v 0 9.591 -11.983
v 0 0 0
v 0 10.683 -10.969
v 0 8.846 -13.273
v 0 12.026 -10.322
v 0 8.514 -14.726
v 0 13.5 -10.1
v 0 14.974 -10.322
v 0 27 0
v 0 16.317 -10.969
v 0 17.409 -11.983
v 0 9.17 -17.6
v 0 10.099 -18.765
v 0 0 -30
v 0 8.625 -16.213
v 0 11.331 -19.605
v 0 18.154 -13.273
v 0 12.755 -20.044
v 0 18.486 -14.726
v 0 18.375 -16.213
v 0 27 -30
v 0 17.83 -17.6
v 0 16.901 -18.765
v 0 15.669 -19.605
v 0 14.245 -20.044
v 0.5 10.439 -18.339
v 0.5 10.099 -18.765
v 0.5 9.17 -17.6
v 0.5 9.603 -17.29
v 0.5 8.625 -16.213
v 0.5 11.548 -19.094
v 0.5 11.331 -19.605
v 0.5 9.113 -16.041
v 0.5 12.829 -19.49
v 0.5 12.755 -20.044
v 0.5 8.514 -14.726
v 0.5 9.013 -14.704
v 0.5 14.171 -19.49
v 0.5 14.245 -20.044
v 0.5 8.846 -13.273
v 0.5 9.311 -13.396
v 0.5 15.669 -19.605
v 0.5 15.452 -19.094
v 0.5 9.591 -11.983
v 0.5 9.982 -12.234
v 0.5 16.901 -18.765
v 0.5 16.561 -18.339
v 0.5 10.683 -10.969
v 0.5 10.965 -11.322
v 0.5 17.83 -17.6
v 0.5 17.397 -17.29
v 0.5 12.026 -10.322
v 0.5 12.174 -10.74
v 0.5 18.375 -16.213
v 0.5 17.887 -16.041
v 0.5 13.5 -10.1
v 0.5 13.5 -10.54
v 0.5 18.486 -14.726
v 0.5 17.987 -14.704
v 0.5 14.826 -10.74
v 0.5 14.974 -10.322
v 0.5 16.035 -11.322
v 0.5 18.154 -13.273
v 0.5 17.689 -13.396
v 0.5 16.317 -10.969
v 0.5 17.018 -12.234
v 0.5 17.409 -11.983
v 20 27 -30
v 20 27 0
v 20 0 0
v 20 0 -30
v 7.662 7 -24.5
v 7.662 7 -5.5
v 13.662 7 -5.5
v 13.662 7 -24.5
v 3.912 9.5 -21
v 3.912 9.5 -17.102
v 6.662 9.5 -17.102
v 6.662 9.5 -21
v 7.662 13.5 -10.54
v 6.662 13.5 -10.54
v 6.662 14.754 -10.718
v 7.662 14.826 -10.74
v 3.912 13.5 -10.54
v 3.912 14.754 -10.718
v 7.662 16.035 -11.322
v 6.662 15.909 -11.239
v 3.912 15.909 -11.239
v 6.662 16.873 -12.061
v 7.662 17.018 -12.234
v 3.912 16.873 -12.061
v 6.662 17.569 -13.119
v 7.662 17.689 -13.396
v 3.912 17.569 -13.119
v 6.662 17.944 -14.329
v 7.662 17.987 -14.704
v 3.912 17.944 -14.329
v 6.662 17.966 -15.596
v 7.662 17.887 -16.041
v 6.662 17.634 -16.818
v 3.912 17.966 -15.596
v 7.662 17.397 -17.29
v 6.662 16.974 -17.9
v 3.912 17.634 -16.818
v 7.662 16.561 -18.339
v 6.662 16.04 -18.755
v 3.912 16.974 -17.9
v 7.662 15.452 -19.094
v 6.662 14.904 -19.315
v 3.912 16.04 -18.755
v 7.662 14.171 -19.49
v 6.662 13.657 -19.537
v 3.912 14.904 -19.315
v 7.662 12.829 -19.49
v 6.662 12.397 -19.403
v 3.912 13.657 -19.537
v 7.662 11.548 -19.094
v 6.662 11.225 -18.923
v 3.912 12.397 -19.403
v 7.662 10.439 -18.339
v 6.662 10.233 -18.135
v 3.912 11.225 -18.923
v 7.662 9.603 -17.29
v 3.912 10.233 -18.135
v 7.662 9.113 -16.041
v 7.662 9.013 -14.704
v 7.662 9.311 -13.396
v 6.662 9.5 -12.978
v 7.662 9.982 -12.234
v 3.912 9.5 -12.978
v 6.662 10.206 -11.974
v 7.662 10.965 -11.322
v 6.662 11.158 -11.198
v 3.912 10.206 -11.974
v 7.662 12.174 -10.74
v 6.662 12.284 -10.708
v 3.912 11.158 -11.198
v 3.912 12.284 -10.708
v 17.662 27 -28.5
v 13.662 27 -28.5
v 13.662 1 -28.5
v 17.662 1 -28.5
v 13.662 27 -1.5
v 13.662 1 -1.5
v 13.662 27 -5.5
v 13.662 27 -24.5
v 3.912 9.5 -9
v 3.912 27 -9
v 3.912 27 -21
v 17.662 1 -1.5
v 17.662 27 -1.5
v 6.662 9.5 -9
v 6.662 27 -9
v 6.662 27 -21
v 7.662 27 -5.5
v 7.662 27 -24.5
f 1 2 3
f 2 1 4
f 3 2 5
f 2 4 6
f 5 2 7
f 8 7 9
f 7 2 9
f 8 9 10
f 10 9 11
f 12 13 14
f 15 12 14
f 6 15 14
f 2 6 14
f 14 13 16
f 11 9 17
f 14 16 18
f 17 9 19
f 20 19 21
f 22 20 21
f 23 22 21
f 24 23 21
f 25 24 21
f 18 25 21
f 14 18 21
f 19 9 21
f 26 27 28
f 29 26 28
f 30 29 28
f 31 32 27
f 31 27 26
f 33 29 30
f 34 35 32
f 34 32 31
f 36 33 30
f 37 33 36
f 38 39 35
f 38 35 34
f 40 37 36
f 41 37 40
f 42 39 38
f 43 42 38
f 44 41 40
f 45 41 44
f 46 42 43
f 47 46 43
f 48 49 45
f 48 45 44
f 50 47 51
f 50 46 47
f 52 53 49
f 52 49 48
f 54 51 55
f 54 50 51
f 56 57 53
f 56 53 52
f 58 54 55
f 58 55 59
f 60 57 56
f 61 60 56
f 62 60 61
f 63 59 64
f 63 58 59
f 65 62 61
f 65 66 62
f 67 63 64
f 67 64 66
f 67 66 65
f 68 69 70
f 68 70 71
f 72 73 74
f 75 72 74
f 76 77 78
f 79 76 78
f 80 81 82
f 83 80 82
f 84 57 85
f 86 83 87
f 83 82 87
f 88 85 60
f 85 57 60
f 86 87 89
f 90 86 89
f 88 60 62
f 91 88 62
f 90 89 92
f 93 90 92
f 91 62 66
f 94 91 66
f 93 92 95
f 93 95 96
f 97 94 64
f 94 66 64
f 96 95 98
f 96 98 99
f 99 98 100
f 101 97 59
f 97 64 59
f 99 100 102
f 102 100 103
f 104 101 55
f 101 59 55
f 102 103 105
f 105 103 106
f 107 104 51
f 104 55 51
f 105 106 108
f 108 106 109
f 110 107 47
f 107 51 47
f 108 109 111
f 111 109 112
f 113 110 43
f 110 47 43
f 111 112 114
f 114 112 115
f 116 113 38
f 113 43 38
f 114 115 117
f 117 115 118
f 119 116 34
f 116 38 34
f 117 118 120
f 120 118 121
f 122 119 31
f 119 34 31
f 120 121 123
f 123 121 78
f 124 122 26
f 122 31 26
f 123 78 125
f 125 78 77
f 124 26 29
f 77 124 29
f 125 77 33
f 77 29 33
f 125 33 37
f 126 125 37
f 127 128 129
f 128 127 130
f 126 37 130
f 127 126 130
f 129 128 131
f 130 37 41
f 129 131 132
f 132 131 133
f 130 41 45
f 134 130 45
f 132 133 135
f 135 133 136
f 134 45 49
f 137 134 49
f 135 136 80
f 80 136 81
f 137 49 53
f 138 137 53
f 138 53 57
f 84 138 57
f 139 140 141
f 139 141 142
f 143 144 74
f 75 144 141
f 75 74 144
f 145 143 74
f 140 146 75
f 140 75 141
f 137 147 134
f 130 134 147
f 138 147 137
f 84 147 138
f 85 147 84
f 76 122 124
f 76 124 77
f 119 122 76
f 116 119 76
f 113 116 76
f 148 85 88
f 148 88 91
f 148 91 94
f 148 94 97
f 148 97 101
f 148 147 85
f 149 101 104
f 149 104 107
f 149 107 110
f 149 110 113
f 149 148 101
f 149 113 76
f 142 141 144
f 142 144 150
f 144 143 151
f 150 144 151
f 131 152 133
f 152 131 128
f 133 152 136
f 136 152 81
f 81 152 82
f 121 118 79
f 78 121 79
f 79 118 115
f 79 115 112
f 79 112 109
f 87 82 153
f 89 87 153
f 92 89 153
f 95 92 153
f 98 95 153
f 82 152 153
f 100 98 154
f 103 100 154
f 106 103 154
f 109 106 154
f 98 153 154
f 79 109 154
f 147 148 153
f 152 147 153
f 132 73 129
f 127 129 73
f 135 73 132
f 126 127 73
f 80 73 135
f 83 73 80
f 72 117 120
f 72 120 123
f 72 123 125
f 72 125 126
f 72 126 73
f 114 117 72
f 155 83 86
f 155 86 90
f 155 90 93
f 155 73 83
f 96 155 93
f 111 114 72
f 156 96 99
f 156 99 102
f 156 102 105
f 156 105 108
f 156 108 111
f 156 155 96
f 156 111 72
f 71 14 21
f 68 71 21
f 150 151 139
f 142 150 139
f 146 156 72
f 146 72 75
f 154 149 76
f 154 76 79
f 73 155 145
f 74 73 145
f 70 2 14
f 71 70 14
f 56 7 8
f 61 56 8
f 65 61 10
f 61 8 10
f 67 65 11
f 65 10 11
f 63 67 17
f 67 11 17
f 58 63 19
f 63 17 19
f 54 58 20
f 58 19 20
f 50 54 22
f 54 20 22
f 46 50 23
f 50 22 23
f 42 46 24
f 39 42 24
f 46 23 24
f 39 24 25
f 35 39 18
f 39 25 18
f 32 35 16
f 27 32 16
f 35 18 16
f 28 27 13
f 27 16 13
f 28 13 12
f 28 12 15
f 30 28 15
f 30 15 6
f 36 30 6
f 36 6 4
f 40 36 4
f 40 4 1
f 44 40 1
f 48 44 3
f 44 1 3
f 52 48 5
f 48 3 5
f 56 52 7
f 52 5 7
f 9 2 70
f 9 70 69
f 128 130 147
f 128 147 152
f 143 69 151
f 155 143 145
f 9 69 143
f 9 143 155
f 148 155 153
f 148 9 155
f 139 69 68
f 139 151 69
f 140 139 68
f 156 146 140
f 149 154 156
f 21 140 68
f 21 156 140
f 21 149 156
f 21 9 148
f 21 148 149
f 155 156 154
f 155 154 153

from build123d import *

# Parameters (mm, degrees)
SKETCH2_W           = 30
SKETCH2_H           = 27
BOSS_EXTRUDE1_DEPTH = 20
SKETCH6_W           = 4
SKETCH6_H           = 27
CUT_EXTRUDE4_DEPTH  = 26
SKETCH9_W           = 6
SKETCH9_H           = 19
CUT_EXTRUDE5_DEPTH  = 20
SKETCH11_R          = 5
CUT_EXTRUDE8_DEPTH  = 0.5
SKETCH12_W          = 2.75
SKETCH12_H          = 12
CUT_EXTRUDE12_DEPTH = 17.5
SKETCH15_R          = 4.5
CUT_EXTRUDE13_DEPTH = 10


with BuildPart() as part:
    # Sketch2 → Boss-Extrude1 (new body)
    with BuildSketch(Plane(origin=(0, 0, 0), x_dir=(0, 0, -1), z_dir=(1, 0, 0))):
        with Locations((15, 13.5)):
            Rectangle(SKETCH2_W, SKETCH2_H)
    extrude(amount=BOSS_EXTRUDE1_DEPTH)

    # Sketch6 → Cut-Extrude4 (cut)
    with BuildSketch(Plane(origin=(2.296116437, 27, -0.293484995), x_dir=(1, 0, 0), z_dir=(0, 1, 0))):
        with Locations((13.365844825, 14.706515005)):
            Rectangle(SKETCH6_W, SKETCH6_H)
    extrude(amount=-CUT_EXTRUDE4_DEPTH, mode=Mode.SUBTRACT)

    # Sketch9 → Cut-Extrude5 (cut)
    with BuildSketch(Plane(origin=(0, 27, 0), x_dir=(1, 0, 0), z_dir=(0, 1, 0))):
        with Locations((10.661961261, 15)):
            Rectangle(SKETCH9_W, SKETCH9_H)
    extrude(amount=-CUT_EXTRUDE5_DEPTH, mode=Mode.SUBTRACT)

    # Sketch11 → Cut-Extrude8 (cut)
    with BuildSketch(Plane.ZY):
        with Locations((-15.1, 13.5)):
            Circle(SKETCH11_R)
    extrude(amount=-CUT_EXTRUDE8_DEPTH, mode=Mode.SUBTRACT)

    # Sketch12 → Cut-Extrude12 (cut)
    with BuildSketch(Plane(origin=(0, 27, 0), x_dir=(1, 0, 0), z_dir=(0, 1, 0))):
        with Locations((5.286961261, 15)):
            Rectangle(SKETCH12_W, SKETCH12_H)
    extrude(amount=-CUT_EXTRUDE12_DEPTH, mode=Mode.SUBTRACT)

    # Sketch15 → Cut-Extrude13 (cut)
    with BuildSketch(Plane.ZY.offset(-0.5)):
        with Locations((-15.04, 13.5)):
            Circle(SKETCH15_R)
    extrude(amount=-CUT_EXTRUDE13_DEPTH, mode=Mode.SUBTRACT)


solid = part.part
